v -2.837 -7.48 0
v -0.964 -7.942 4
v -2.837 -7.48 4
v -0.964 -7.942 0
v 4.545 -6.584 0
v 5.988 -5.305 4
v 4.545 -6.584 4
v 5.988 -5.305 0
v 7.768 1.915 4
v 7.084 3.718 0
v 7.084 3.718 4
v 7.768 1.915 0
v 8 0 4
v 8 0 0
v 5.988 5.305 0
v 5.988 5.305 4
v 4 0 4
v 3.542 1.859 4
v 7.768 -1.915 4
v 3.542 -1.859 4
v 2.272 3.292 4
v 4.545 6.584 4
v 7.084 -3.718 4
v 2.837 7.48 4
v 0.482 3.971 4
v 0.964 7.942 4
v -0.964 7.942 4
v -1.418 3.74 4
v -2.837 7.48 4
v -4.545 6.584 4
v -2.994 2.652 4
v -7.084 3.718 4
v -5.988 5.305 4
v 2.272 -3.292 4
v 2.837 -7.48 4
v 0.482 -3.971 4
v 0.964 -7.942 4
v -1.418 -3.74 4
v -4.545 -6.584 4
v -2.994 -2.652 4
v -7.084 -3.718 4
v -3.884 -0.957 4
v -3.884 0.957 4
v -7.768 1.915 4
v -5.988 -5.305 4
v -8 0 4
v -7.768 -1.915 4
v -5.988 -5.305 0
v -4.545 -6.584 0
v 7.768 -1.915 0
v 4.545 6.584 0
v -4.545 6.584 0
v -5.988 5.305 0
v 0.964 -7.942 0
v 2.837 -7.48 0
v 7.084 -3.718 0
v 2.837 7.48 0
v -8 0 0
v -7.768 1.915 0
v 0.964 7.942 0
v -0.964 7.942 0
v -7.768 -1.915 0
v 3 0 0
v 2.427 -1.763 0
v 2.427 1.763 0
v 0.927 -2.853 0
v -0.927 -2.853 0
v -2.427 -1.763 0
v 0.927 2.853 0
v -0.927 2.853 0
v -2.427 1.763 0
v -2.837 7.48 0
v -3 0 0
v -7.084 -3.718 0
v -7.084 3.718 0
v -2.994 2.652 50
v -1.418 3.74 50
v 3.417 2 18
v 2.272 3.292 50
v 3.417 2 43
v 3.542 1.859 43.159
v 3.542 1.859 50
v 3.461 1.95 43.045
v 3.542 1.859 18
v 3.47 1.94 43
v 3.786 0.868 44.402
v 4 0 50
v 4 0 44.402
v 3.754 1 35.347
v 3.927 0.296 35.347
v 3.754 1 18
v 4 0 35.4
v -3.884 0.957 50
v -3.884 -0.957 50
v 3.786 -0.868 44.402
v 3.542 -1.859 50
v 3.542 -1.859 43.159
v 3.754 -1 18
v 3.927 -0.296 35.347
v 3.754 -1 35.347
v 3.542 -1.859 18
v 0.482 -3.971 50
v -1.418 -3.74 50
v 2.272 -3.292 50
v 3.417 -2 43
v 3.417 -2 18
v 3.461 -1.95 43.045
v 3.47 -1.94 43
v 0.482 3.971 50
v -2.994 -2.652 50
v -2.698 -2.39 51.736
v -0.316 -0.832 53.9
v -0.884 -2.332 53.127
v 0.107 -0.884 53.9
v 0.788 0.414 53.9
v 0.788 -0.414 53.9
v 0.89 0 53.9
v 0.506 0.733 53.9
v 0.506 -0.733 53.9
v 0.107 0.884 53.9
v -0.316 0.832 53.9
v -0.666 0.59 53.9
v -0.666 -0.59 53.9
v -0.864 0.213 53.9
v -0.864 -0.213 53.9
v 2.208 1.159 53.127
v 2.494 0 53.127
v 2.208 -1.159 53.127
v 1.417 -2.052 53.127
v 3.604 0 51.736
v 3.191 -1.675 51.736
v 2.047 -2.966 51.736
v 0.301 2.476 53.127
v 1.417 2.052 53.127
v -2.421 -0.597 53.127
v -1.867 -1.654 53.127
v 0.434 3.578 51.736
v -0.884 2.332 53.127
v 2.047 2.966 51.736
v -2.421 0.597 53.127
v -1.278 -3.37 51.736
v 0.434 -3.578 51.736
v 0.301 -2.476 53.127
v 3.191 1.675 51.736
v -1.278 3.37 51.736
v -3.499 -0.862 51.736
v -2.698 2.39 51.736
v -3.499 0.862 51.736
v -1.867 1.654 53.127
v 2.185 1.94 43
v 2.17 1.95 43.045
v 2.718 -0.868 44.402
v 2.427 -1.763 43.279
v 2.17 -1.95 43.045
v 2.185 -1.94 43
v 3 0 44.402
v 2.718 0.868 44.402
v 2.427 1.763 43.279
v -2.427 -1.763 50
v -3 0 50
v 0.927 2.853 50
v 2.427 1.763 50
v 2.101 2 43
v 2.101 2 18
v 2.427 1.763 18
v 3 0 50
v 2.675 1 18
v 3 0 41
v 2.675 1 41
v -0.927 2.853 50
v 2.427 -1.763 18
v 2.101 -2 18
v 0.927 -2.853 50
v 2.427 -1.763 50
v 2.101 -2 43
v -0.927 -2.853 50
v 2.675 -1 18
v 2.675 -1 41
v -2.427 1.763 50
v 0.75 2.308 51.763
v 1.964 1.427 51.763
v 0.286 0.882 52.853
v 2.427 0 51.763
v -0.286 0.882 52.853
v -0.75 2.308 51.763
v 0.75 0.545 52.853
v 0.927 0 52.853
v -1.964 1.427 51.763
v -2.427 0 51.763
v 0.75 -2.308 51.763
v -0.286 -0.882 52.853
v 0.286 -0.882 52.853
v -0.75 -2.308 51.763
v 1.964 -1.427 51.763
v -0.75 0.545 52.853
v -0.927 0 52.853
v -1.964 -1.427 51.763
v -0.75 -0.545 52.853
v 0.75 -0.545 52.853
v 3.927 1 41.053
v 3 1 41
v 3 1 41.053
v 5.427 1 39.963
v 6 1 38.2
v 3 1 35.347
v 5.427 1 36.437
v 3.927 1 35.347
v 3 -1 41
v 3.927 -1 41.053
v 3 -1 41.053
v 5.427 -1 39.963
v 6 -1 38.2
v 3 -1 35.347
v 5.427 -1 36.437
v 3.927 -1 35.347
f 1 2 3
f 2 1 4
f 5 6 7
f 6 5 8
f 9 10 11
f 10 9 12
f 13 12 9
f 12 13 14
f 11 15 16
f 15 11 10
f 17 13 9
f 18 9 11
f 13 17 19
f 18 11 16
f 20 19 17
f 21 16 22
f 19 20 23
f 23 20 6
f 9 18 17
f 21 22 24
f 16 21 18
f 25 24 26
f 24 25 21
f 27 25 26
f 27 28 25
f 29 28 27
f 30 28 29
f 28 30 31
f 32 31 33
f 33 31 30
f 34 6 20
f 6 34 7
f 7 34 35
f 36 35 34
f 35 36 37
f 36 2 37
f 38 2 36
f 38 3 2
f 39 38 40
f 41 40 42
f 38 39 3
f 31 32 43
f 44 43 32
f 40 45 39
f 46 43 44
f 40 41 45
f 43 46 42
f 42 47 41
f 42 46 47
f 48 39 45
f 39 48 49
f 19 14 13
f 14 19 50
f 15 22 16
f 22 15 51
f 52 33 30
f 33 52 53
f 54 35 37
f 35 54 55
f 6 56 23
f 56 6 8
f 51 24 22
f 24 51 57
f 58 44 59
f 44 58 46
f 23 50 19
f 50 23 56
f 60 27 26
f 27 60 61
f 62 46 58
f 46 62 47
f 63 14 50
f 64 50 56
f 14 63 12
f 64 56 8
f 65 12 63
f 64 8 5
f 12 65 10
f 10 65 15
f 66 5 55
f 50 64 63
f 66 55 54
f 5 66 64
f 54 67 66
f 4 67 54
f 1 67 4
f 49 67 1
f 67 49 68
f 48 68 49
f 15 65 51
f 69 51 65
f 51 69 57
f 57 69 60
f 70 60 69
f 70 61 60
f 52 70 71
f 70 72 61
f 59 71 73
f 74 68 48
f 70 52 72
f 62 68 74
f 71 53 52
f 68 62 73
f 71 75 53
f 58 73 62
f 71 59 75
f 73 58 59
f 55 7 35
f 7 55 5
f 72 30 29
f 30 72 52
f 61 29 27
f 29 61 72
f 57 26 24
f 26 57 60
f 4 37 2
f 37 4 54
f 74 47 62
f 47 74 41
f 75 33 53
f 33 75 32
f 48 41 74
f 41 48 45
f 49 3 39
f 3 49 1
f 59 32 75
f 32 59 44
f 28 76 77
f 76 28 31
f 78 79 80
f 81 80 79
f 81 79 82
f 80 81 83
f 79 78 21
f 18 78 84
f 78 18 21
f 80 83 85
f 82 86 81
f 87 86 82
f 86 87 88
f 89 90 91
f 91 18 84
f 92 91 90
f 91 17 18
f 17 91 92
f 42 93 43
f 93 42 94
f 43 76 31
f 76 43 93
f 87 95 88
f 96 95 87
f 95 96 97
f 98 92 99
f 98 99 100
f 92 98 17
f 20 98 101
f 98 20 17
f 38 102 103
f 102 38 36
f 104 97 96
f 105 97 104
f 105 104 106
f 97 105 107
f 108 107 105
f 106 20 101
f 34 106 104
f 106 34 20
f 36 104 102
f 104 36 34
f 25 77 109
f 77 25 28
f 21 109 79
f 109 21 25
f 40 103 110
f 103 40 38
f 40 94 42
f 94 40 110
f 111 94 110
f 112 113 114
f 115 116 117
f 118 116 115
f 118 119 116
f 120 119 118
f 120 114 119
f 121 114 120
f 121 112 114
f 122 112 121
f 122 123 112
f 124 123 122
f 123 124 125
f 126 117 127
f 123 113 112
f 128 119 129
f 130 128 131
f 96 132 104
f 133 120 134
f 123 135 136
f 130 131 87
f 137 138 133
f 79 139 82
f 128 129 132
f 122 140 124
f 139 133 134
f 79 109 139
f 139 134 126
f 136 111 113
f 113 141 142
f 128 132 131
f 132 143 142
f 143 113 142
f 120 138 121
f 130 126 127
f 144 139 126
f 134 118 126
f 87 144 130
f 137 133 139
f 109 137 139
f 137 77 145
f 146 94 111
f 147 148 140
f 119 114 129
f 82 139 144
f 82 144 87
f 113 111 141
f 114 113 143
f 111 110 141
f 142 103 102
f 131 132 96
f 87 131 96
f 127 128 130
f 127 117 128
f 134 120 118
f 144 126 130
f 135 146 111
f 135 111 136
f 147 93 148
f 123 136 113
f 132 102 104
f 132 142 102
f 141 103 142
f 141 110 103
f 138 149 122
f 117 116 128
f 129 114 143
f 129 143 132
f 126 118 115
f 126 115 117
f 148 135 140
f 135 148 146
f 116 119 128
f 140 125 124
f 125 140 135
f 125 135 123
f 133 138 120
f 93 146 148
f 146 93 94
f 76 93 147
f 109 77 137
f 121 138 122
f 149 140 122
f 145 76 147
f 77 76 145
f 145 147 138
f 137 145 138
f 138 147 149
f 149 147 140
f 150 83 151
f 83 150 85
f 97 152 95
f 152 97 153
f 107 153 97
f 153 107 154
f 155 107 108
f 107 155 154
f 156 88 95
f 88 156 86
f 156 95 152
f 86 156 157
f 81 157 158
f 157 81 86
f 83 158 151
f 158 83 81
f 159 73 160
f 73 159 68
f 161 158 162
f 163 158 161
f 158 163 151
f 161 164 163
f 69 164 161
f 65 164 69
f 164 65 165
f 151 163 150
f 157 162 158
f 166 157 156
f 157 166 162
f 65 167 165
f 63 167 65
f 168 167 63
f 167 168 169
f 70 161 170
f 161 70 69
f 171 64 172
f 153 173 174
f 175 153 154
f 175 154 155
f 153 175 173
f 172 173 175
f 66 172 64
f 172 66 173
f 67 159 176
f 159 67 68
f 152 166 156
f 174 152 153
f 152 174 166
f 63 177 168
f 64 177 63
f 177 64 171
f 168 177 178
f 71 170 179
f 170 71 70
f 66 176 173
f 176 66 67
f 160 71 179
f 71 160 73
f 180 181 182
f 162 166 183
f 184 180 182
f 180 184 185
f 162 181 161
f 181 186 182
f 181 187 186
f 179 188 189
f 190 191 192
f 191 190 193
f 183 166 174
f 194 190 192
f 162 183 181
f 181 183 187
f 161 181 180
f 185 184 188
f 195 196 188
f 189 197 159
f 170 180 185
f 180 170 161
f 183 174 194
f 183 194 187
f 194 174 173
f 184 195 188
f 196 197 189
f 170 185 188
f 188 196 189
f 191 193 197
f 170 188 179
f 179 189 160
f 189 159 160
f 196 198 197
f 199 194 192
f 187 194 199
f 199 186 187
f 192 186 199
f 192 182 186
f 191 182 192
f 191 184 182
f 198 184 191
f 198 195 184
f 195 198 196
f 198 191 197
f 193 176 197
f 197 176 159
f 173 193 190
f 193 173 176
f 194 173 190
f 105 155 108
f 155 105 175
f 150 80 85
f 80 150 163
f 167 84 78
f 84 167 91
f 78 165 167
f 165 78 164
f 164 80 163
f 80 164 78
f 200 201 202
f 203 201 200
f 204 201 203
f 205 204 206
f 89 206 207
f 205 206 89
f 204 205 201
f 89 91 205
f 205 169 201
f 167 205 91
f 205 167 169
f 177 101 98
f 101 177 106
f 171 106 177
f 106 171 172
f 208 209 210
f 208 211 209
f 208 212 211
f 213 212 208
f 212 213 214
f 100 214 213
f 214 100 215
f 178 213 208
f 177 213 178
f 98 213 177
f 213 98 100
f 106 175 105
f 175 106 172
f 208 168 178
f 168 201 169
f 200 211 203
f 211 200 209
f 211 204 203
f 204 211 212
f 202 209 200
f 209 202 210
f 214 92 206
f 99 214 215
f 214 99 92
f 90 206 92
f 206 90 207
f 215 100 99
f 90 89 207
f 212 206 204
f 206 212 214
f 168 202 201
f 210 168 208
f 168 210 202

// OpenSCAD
// pin D = 8mm
union(){
difference(){
	union (){
		cylinder(r = 8, h =4);
		cylinder(r = 4, h =50);
		translate([0,0,50]) sphere(r = 4);

	}
	union() {
		translate([0,0,-1]) cylinder(r = 3, h = 51);
		translate([0,0,50]) sphere(r = 3);
		translate([0,1,18]) cube ([5,1,25]);
		translate([0,-2,18]) cube ([5,1,25]);
		translate([0,-2,41]) cube ([5,4,2]);
		translate([0,0,42.6]) {
			difference() {
				rotate(a = [0,90,0]) cylinder (r = 2, h = 5);
				translate([0,-2,-2]) cube ([5,4,2]);
			}
		}
//translate([-5,0,40]) cube(10);
	}
}
		translate([3,1,38.2]){
	difference(){	
	rotate (a =[90,0,0]) cylinder (r = 3 , h = 2);
	translate([-5,-3,-4]) cube ([5, 4, 8]);}
}
}
